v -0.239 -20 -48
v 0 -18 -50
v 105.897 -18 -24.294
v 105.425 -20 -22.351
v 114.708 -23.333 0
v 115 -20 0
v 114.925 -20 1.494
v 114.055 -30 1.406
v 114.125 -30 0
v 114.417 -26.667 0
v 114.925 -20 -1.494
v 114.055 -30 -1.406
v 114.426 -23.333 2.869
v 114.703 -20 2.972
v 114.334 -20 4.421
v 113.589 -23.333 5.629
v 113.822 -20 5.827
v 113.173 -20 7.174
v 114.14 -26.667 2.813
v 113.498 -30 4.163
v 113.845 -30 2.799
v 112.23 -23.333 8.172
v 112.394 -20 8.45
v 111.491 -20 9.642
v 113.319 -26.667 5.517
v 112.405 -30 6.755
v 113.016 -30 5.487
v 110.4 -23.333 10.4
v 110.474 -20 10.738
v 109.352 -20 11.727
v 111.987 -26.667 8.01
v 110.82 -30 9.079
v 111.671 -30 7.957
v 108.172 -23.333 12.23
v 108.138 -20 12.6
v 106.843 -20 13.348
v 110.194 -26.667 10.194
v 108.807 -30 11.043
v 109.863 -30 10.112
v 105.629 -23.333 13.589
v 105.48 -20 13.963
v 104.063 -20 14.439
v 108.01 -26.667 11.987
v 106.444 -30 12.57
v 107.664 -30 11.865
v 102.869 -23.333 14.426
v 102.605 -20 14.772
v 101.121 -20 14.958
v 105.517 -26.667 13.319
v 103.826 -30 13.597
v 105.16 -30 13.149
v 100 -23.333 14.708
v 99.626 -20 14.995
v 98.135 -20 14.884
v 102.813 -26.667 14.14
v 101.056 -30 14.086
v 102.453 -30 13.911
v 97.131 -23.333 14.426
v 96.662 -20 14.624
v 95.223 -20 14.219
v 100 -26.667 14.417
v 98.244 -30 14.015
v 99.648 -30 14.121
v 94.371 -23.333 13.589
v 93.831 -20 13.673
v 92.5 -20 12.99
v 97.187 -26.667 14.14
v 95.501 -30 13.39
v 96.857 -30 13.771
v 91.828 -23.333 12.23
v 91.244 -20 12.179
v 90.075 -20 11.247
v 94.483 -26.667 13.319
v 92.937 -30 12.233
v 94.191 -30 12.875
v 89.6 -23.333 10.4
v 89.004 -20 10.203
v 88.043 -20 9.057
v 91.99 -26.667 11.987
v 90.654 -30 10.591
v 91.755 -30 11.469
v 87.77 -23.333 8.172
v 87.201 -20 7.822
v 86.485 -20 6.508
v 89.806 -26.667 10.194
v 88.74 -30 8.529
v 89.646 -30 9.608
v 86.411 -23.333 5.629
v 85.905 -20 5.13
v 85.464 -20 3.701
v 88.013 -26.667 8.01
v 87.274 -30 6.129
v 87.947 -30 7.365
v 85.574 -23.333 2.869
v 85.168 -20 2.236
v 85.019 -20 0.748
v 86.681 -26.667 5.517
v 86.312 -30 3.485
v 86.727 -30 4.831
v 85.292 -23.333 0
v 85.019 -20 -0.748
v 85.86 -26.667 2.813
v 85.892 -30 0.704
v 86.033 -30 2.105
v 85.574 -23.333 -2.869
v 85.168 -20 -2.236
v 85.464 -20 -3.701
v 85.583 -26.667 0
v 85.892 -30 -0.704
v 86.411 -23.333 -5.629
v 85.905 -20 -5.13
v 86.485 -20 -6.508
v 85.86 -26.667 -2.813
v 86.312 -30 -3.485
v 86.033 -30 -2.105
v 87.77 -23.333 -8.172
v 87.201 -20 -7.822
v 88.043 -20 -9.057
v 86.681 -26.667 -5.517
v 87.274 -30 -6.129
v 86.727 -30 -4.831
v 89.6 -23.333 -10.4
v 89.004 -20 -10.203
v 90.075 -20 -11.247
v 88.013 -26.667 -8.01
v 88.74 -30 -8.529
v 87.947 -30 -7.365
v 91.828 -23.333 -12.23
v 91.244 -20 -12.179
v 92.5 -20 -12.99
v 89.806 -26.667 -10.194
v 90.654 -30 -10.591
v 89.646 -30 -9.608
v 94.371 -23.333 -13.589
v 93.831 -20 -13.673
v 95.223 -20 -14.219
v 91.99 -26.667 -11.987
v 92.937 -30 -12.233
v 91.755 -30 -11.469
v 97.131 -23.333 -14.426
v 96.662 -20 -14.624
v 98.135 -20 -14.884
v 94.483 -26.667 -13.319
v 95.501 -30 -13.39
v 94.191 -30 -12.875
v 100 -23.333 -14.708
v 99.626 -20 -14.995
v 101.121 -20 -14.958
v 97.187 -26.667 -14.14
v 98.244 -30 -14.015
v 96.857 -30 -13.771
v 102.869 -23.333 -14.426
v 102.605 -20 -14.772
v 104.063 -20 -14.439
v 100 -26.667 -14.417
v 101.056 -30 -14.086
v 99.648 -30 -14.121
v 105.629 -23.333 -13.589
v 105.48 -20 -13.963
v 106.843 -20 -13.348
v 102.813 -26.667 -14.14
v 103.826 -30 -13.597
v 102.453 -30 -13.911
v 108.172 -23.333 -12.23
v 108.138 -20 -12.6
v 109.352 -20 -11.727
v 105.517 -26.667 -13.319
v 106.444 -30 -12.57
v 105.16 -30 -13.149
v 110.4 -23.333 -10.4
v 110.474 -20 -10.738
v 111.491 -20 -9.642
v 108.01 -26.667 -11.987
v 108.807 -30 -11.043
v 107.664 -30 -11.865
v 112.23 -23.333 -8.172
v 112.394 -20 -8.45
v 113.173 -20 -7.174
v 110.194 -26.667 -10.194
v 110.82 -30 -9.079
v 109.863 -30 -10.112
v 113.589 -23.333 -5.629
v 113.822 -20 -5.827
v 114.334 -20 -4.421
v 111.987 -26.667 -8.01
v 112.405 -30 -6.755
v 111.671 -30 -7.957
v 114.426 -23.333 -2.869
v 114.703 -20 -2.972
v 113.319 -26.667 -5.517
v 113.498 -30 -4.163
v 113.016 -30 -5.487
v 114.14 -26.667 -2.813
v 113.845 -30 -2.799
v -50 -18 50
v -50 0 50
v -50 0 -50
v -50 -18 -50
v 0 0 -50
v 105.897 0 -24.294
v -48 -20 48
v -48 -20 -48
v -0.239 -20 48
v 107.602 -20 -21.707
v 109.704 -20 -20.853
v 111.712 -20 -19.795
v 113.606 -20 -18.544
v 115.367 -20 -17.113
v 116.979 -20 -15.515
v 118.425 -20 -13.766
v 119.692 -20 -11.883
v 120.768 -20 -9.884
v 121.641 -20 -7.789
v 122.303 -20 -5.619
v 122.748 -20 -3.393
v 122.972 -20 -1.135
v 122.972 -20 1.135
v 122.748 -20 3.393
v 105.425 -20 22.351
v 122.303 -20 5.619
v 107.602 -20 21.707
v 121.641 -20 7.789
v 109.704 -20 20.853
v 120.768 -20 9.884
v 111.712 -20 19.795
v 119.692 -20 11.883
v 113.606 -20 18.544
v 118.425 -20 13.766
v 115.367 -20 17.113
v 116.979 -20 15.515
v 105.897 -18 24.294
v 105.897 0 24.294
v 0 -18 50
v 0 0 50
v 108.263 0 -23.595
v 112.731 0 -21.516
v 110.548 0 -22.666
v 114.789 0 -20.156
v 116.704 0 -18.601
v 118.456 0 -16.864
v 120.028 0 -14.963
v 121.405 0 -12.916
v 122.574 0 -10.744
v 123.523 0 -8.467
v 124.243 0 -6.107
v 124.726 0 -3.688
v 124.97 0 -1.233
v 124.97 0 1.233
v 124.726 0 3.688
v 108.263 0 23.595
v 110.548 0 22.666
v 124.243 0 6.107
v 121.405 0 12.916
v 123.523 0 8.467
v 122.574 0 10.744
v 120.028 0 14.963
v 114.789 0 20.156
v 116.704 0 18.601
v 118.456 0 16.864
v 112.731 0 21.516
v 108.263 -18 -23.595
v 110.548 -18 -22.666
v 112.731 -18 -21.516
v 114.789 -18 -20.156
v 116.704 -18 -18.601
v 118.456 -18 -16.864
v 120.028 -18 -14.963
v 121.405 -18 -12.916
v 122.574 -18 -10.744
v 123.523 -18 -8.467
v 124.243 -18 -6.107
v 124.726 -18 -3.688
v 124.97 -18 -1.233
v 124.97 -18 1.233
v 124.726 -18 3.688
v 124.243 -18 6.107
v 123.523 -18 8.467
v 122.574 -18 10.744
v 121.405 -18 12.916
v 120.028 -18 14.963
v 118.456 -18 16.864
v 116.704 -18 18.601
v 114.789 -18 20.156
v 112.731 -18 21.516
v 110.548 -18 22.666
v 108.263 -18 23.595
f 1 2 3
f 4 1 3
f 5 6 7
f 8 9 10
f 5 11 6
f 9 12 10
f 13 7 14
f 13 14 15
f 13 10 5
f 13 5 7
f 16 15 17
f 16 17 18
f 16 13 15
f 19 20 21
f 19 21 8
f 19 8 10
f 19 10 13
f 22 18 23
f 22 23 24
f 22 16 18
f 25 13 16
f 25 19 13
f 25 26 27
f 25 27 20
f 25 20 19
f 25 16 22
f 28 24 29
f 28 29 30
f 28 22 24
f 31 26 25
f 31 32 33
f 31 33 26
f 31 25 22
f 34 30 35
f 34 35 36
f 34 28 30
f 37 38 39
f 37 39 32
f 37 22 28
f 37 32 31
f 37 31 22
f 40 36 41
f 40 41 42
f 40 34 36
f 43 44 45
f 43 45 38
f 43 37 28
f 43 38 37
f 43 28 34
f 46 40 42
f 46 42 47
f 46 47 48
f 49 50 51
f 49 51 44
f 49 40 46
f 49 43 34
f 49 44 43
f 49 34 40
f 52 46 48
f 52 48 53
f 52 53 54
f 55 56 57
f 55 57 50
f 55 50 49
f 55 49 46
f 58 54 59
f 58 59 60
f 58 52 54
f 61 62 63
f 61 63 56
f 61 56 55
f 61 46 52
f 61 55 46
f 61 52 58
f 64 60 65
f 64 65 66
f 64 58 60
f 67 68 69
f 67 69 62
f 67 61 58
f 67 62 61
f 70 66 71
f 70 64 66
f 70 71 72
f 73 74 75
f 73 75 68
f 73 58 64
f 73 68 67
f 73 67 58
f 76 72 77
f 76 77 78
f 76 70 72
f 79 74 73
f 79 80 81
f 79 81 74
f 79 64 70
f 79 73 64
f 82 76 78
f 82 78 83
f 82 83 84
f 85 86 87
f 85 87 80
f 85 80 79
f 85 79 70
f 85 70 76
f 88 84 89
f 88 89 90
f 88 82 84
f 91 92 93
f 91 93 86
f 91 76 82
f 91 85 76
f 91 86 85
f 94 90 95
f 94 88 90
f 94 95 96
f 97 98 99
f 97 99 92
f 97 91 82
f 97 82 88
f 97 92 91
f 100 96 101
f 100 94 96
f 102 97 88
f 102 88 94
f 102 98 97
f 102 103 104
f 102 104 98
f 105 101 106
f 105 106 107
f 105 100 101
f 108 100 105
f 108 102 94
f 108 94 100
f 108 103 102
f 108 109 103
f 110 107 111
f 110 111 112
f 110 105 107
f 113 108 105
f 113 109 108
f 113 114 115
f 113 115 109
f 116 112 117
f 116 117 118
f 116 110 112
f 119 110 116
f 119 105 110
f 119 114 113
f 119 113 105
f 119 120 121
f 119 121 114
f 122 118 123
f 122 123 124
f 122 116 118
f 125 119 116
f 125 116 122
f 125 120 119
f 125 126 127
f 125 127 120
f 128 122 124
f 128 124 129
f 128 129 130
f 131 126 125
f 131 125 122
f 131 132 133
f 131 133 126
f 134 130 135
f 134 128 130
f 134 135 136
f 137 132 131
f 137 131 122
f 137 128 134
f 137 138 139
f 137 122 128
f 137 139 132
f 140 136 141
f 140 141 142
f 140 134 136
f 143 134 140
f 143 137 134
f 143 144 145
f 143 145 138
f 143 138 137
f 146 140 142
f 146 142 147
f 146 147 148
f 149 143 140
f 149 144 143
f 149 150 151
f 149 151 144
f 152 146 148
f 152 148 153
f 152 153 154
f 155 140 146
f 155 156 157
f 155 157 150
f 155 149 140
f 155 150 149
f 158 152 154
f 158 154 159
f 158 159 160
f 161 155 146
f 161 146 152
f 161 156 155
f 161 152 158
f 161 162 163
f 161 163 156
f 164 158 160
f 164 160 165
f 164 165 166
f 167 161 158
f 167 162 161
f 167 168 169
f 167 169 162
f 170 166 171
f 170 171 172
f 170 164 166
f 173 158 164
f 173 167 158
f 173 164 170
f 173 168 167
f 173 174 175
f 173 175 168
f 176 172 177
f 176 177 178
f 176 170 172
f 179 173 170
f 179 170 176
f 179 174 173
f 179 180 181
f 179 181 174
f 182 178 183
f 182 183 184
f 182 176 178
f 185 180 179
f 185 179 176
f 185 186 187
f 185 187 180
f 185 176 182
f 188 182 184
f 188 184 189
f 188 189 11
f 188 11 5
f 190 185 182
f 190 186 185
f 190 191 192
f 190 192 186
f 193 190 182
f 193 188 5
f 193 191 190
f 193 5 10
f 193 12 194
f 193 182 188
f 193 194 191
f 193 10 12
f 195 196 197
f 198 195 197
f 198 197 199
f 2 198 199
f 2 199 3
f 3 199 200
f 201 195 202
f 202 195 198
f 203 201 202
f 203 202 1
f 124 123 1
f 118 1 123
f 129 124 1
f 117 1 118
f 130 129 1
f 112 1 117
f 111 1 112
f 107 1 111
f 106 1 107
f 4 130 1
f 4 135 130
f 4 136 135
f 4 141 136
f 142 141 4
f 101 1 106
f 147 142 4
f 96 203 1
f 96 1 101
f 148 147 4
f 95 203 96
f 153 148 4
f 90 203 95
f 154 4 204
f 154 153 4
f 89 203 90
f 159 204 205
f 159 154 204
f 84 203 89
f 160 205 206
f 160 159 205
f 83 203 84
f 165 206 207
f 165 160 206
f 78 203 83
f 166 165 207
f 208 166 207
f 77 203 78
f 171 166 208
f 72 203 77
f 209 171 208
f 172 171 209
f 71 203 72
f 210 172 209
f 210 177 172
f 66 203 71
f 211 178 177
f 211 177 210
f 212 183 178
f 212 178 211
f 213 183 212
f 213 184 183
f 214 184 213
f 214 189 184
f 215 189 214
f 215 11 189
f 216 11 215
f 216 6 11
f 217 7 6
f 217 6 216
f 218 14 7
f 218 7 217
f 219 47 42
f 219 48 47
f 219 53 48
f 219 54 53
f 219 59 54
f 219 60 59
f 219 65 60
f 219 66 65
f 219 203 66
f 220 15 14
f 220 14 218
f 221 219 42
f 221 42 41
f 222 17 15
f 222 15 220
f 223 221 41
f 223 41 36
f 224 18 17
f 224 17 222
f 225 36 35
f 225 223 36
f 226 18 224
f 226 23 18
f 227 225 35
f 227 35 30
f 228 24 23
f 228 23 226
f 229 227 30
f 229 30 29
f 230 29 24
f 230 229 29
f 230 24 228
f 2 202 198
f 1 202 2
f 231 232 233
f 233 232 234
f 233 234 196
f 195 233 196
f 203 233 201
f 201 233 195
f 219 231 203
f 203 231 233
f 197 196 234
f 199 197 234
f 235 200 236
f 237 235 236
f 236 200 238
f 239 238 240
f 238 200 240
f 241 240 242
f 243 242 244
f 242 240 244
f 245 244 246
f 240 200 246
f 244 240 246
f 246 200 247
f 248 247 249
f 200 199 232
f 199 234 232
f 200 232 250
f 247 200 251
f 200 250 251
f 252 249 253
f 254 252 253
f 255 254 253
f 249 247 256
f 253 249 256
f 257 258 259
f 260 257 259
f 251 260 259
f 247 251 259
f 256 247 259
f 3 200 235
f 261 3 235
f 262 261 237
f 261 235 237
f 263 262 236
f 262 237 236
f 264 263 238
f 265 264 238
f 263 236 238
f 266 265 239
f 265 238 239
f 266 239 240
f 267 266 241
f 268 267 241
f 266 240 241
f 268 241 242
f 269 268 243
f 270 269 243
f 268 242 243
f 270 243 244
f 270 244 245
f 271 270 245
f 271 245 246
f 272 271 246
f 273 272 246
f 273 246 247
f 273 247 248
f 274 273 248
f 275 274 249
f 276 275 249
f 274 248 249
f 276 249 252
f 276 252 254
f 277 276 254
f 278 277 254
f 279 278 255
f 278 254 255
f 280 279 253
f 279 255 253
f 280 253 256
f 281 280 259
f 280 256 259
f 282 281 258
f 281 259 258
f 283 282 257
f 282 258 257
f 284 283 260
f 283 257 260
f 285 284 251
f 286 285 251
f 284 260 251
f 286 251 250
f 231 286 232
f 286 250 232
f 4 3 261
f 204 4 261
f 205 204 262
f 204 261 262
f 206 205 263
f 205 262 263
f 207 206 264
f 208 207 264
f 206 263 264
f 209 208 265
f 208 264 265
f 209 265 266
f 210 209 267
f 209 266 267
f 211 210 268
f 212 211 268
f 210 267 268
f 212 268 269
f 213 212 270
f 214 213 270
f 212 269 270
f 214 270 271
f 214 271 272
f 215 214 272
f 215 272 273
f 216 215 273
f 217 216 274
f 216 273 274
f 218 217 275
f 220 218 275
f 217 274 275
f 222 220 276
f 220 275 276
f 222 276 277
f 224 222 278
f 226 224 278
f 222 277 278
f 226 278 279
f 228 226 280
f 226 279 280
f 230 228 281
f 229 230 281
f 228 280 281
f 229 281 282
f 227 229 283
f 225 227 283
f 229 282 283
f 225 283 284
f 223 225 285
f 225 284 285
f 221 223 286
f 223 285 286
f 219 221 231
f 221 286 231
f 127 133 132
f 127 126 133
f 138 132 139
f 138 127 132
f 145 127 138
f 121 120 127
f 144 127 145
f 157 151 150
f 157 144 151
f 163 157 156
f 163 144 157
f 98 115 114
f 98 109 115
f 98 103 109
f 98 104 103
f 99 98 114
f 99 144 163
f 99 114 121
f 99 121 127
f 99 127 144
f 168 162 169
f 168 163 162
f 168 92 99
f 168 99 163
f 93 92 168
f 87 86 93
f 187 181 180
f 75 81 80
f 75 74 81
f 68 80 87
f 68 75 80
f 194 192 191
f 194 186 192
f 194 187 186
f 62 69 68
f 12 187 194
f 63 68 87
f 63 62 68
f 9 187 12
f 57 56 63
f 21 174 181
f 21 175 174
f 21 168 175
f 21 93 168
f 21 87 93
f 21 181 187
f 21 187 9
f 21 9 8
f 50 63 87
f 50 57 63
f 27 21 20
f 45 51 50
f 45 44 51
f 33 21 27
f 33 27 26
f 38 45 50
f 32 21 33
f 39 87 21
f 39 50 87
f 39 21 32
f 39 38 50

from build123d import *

# Parameters (mm, degrees)
F1_DEPTH = 20
F2_R     = 15
F3_DEPTH = 10
F3_TAPER = 5
F4_SIZE  = 2


with BuildPart() as f1:
    # F0 (on Front) → F1 (new body)
    with BuildSketch(Plane.XZ):
        with BuildLine():
            Line((0, -50), (105.8972473589, -24.2944947177))
            ThreePointArc((105.8972473589, -24.2944947177), (125, 0), (105.8972473589, 24.2944947177))
            Line((105.8972473589, 24.2944947177), (0, 50))
            Line((0, 50), (-50, 50))
            Line((-50, 50), (-50, -50))
            Line((-50, -50), (0, -50))
        make_face()
    extrude(amount=F1_DEPTH)

    # F2 (on face) → F3 (join)
    with BuildSketch(Plane.XZ.offset(20)):
        with Locations((100, 0)):
            Circle(F2_R)
    extrude(amount=F3_DEPTH, taper=F3_TAPER)

    # F4
    f4_edges = [f1.edges().sort_by_distance(p)[0] for p in [
        (52.948624, -20, 37.147247),
        (-25, -20, 50),
        (-50, -20, 0),
        (-25, -20, -50),
        (52.948624, -20, -37.147247),
        (125, -20, 0),
    ]]
    chamfer(f4_edges, length=F4_SIZE)


solid = f1.part
